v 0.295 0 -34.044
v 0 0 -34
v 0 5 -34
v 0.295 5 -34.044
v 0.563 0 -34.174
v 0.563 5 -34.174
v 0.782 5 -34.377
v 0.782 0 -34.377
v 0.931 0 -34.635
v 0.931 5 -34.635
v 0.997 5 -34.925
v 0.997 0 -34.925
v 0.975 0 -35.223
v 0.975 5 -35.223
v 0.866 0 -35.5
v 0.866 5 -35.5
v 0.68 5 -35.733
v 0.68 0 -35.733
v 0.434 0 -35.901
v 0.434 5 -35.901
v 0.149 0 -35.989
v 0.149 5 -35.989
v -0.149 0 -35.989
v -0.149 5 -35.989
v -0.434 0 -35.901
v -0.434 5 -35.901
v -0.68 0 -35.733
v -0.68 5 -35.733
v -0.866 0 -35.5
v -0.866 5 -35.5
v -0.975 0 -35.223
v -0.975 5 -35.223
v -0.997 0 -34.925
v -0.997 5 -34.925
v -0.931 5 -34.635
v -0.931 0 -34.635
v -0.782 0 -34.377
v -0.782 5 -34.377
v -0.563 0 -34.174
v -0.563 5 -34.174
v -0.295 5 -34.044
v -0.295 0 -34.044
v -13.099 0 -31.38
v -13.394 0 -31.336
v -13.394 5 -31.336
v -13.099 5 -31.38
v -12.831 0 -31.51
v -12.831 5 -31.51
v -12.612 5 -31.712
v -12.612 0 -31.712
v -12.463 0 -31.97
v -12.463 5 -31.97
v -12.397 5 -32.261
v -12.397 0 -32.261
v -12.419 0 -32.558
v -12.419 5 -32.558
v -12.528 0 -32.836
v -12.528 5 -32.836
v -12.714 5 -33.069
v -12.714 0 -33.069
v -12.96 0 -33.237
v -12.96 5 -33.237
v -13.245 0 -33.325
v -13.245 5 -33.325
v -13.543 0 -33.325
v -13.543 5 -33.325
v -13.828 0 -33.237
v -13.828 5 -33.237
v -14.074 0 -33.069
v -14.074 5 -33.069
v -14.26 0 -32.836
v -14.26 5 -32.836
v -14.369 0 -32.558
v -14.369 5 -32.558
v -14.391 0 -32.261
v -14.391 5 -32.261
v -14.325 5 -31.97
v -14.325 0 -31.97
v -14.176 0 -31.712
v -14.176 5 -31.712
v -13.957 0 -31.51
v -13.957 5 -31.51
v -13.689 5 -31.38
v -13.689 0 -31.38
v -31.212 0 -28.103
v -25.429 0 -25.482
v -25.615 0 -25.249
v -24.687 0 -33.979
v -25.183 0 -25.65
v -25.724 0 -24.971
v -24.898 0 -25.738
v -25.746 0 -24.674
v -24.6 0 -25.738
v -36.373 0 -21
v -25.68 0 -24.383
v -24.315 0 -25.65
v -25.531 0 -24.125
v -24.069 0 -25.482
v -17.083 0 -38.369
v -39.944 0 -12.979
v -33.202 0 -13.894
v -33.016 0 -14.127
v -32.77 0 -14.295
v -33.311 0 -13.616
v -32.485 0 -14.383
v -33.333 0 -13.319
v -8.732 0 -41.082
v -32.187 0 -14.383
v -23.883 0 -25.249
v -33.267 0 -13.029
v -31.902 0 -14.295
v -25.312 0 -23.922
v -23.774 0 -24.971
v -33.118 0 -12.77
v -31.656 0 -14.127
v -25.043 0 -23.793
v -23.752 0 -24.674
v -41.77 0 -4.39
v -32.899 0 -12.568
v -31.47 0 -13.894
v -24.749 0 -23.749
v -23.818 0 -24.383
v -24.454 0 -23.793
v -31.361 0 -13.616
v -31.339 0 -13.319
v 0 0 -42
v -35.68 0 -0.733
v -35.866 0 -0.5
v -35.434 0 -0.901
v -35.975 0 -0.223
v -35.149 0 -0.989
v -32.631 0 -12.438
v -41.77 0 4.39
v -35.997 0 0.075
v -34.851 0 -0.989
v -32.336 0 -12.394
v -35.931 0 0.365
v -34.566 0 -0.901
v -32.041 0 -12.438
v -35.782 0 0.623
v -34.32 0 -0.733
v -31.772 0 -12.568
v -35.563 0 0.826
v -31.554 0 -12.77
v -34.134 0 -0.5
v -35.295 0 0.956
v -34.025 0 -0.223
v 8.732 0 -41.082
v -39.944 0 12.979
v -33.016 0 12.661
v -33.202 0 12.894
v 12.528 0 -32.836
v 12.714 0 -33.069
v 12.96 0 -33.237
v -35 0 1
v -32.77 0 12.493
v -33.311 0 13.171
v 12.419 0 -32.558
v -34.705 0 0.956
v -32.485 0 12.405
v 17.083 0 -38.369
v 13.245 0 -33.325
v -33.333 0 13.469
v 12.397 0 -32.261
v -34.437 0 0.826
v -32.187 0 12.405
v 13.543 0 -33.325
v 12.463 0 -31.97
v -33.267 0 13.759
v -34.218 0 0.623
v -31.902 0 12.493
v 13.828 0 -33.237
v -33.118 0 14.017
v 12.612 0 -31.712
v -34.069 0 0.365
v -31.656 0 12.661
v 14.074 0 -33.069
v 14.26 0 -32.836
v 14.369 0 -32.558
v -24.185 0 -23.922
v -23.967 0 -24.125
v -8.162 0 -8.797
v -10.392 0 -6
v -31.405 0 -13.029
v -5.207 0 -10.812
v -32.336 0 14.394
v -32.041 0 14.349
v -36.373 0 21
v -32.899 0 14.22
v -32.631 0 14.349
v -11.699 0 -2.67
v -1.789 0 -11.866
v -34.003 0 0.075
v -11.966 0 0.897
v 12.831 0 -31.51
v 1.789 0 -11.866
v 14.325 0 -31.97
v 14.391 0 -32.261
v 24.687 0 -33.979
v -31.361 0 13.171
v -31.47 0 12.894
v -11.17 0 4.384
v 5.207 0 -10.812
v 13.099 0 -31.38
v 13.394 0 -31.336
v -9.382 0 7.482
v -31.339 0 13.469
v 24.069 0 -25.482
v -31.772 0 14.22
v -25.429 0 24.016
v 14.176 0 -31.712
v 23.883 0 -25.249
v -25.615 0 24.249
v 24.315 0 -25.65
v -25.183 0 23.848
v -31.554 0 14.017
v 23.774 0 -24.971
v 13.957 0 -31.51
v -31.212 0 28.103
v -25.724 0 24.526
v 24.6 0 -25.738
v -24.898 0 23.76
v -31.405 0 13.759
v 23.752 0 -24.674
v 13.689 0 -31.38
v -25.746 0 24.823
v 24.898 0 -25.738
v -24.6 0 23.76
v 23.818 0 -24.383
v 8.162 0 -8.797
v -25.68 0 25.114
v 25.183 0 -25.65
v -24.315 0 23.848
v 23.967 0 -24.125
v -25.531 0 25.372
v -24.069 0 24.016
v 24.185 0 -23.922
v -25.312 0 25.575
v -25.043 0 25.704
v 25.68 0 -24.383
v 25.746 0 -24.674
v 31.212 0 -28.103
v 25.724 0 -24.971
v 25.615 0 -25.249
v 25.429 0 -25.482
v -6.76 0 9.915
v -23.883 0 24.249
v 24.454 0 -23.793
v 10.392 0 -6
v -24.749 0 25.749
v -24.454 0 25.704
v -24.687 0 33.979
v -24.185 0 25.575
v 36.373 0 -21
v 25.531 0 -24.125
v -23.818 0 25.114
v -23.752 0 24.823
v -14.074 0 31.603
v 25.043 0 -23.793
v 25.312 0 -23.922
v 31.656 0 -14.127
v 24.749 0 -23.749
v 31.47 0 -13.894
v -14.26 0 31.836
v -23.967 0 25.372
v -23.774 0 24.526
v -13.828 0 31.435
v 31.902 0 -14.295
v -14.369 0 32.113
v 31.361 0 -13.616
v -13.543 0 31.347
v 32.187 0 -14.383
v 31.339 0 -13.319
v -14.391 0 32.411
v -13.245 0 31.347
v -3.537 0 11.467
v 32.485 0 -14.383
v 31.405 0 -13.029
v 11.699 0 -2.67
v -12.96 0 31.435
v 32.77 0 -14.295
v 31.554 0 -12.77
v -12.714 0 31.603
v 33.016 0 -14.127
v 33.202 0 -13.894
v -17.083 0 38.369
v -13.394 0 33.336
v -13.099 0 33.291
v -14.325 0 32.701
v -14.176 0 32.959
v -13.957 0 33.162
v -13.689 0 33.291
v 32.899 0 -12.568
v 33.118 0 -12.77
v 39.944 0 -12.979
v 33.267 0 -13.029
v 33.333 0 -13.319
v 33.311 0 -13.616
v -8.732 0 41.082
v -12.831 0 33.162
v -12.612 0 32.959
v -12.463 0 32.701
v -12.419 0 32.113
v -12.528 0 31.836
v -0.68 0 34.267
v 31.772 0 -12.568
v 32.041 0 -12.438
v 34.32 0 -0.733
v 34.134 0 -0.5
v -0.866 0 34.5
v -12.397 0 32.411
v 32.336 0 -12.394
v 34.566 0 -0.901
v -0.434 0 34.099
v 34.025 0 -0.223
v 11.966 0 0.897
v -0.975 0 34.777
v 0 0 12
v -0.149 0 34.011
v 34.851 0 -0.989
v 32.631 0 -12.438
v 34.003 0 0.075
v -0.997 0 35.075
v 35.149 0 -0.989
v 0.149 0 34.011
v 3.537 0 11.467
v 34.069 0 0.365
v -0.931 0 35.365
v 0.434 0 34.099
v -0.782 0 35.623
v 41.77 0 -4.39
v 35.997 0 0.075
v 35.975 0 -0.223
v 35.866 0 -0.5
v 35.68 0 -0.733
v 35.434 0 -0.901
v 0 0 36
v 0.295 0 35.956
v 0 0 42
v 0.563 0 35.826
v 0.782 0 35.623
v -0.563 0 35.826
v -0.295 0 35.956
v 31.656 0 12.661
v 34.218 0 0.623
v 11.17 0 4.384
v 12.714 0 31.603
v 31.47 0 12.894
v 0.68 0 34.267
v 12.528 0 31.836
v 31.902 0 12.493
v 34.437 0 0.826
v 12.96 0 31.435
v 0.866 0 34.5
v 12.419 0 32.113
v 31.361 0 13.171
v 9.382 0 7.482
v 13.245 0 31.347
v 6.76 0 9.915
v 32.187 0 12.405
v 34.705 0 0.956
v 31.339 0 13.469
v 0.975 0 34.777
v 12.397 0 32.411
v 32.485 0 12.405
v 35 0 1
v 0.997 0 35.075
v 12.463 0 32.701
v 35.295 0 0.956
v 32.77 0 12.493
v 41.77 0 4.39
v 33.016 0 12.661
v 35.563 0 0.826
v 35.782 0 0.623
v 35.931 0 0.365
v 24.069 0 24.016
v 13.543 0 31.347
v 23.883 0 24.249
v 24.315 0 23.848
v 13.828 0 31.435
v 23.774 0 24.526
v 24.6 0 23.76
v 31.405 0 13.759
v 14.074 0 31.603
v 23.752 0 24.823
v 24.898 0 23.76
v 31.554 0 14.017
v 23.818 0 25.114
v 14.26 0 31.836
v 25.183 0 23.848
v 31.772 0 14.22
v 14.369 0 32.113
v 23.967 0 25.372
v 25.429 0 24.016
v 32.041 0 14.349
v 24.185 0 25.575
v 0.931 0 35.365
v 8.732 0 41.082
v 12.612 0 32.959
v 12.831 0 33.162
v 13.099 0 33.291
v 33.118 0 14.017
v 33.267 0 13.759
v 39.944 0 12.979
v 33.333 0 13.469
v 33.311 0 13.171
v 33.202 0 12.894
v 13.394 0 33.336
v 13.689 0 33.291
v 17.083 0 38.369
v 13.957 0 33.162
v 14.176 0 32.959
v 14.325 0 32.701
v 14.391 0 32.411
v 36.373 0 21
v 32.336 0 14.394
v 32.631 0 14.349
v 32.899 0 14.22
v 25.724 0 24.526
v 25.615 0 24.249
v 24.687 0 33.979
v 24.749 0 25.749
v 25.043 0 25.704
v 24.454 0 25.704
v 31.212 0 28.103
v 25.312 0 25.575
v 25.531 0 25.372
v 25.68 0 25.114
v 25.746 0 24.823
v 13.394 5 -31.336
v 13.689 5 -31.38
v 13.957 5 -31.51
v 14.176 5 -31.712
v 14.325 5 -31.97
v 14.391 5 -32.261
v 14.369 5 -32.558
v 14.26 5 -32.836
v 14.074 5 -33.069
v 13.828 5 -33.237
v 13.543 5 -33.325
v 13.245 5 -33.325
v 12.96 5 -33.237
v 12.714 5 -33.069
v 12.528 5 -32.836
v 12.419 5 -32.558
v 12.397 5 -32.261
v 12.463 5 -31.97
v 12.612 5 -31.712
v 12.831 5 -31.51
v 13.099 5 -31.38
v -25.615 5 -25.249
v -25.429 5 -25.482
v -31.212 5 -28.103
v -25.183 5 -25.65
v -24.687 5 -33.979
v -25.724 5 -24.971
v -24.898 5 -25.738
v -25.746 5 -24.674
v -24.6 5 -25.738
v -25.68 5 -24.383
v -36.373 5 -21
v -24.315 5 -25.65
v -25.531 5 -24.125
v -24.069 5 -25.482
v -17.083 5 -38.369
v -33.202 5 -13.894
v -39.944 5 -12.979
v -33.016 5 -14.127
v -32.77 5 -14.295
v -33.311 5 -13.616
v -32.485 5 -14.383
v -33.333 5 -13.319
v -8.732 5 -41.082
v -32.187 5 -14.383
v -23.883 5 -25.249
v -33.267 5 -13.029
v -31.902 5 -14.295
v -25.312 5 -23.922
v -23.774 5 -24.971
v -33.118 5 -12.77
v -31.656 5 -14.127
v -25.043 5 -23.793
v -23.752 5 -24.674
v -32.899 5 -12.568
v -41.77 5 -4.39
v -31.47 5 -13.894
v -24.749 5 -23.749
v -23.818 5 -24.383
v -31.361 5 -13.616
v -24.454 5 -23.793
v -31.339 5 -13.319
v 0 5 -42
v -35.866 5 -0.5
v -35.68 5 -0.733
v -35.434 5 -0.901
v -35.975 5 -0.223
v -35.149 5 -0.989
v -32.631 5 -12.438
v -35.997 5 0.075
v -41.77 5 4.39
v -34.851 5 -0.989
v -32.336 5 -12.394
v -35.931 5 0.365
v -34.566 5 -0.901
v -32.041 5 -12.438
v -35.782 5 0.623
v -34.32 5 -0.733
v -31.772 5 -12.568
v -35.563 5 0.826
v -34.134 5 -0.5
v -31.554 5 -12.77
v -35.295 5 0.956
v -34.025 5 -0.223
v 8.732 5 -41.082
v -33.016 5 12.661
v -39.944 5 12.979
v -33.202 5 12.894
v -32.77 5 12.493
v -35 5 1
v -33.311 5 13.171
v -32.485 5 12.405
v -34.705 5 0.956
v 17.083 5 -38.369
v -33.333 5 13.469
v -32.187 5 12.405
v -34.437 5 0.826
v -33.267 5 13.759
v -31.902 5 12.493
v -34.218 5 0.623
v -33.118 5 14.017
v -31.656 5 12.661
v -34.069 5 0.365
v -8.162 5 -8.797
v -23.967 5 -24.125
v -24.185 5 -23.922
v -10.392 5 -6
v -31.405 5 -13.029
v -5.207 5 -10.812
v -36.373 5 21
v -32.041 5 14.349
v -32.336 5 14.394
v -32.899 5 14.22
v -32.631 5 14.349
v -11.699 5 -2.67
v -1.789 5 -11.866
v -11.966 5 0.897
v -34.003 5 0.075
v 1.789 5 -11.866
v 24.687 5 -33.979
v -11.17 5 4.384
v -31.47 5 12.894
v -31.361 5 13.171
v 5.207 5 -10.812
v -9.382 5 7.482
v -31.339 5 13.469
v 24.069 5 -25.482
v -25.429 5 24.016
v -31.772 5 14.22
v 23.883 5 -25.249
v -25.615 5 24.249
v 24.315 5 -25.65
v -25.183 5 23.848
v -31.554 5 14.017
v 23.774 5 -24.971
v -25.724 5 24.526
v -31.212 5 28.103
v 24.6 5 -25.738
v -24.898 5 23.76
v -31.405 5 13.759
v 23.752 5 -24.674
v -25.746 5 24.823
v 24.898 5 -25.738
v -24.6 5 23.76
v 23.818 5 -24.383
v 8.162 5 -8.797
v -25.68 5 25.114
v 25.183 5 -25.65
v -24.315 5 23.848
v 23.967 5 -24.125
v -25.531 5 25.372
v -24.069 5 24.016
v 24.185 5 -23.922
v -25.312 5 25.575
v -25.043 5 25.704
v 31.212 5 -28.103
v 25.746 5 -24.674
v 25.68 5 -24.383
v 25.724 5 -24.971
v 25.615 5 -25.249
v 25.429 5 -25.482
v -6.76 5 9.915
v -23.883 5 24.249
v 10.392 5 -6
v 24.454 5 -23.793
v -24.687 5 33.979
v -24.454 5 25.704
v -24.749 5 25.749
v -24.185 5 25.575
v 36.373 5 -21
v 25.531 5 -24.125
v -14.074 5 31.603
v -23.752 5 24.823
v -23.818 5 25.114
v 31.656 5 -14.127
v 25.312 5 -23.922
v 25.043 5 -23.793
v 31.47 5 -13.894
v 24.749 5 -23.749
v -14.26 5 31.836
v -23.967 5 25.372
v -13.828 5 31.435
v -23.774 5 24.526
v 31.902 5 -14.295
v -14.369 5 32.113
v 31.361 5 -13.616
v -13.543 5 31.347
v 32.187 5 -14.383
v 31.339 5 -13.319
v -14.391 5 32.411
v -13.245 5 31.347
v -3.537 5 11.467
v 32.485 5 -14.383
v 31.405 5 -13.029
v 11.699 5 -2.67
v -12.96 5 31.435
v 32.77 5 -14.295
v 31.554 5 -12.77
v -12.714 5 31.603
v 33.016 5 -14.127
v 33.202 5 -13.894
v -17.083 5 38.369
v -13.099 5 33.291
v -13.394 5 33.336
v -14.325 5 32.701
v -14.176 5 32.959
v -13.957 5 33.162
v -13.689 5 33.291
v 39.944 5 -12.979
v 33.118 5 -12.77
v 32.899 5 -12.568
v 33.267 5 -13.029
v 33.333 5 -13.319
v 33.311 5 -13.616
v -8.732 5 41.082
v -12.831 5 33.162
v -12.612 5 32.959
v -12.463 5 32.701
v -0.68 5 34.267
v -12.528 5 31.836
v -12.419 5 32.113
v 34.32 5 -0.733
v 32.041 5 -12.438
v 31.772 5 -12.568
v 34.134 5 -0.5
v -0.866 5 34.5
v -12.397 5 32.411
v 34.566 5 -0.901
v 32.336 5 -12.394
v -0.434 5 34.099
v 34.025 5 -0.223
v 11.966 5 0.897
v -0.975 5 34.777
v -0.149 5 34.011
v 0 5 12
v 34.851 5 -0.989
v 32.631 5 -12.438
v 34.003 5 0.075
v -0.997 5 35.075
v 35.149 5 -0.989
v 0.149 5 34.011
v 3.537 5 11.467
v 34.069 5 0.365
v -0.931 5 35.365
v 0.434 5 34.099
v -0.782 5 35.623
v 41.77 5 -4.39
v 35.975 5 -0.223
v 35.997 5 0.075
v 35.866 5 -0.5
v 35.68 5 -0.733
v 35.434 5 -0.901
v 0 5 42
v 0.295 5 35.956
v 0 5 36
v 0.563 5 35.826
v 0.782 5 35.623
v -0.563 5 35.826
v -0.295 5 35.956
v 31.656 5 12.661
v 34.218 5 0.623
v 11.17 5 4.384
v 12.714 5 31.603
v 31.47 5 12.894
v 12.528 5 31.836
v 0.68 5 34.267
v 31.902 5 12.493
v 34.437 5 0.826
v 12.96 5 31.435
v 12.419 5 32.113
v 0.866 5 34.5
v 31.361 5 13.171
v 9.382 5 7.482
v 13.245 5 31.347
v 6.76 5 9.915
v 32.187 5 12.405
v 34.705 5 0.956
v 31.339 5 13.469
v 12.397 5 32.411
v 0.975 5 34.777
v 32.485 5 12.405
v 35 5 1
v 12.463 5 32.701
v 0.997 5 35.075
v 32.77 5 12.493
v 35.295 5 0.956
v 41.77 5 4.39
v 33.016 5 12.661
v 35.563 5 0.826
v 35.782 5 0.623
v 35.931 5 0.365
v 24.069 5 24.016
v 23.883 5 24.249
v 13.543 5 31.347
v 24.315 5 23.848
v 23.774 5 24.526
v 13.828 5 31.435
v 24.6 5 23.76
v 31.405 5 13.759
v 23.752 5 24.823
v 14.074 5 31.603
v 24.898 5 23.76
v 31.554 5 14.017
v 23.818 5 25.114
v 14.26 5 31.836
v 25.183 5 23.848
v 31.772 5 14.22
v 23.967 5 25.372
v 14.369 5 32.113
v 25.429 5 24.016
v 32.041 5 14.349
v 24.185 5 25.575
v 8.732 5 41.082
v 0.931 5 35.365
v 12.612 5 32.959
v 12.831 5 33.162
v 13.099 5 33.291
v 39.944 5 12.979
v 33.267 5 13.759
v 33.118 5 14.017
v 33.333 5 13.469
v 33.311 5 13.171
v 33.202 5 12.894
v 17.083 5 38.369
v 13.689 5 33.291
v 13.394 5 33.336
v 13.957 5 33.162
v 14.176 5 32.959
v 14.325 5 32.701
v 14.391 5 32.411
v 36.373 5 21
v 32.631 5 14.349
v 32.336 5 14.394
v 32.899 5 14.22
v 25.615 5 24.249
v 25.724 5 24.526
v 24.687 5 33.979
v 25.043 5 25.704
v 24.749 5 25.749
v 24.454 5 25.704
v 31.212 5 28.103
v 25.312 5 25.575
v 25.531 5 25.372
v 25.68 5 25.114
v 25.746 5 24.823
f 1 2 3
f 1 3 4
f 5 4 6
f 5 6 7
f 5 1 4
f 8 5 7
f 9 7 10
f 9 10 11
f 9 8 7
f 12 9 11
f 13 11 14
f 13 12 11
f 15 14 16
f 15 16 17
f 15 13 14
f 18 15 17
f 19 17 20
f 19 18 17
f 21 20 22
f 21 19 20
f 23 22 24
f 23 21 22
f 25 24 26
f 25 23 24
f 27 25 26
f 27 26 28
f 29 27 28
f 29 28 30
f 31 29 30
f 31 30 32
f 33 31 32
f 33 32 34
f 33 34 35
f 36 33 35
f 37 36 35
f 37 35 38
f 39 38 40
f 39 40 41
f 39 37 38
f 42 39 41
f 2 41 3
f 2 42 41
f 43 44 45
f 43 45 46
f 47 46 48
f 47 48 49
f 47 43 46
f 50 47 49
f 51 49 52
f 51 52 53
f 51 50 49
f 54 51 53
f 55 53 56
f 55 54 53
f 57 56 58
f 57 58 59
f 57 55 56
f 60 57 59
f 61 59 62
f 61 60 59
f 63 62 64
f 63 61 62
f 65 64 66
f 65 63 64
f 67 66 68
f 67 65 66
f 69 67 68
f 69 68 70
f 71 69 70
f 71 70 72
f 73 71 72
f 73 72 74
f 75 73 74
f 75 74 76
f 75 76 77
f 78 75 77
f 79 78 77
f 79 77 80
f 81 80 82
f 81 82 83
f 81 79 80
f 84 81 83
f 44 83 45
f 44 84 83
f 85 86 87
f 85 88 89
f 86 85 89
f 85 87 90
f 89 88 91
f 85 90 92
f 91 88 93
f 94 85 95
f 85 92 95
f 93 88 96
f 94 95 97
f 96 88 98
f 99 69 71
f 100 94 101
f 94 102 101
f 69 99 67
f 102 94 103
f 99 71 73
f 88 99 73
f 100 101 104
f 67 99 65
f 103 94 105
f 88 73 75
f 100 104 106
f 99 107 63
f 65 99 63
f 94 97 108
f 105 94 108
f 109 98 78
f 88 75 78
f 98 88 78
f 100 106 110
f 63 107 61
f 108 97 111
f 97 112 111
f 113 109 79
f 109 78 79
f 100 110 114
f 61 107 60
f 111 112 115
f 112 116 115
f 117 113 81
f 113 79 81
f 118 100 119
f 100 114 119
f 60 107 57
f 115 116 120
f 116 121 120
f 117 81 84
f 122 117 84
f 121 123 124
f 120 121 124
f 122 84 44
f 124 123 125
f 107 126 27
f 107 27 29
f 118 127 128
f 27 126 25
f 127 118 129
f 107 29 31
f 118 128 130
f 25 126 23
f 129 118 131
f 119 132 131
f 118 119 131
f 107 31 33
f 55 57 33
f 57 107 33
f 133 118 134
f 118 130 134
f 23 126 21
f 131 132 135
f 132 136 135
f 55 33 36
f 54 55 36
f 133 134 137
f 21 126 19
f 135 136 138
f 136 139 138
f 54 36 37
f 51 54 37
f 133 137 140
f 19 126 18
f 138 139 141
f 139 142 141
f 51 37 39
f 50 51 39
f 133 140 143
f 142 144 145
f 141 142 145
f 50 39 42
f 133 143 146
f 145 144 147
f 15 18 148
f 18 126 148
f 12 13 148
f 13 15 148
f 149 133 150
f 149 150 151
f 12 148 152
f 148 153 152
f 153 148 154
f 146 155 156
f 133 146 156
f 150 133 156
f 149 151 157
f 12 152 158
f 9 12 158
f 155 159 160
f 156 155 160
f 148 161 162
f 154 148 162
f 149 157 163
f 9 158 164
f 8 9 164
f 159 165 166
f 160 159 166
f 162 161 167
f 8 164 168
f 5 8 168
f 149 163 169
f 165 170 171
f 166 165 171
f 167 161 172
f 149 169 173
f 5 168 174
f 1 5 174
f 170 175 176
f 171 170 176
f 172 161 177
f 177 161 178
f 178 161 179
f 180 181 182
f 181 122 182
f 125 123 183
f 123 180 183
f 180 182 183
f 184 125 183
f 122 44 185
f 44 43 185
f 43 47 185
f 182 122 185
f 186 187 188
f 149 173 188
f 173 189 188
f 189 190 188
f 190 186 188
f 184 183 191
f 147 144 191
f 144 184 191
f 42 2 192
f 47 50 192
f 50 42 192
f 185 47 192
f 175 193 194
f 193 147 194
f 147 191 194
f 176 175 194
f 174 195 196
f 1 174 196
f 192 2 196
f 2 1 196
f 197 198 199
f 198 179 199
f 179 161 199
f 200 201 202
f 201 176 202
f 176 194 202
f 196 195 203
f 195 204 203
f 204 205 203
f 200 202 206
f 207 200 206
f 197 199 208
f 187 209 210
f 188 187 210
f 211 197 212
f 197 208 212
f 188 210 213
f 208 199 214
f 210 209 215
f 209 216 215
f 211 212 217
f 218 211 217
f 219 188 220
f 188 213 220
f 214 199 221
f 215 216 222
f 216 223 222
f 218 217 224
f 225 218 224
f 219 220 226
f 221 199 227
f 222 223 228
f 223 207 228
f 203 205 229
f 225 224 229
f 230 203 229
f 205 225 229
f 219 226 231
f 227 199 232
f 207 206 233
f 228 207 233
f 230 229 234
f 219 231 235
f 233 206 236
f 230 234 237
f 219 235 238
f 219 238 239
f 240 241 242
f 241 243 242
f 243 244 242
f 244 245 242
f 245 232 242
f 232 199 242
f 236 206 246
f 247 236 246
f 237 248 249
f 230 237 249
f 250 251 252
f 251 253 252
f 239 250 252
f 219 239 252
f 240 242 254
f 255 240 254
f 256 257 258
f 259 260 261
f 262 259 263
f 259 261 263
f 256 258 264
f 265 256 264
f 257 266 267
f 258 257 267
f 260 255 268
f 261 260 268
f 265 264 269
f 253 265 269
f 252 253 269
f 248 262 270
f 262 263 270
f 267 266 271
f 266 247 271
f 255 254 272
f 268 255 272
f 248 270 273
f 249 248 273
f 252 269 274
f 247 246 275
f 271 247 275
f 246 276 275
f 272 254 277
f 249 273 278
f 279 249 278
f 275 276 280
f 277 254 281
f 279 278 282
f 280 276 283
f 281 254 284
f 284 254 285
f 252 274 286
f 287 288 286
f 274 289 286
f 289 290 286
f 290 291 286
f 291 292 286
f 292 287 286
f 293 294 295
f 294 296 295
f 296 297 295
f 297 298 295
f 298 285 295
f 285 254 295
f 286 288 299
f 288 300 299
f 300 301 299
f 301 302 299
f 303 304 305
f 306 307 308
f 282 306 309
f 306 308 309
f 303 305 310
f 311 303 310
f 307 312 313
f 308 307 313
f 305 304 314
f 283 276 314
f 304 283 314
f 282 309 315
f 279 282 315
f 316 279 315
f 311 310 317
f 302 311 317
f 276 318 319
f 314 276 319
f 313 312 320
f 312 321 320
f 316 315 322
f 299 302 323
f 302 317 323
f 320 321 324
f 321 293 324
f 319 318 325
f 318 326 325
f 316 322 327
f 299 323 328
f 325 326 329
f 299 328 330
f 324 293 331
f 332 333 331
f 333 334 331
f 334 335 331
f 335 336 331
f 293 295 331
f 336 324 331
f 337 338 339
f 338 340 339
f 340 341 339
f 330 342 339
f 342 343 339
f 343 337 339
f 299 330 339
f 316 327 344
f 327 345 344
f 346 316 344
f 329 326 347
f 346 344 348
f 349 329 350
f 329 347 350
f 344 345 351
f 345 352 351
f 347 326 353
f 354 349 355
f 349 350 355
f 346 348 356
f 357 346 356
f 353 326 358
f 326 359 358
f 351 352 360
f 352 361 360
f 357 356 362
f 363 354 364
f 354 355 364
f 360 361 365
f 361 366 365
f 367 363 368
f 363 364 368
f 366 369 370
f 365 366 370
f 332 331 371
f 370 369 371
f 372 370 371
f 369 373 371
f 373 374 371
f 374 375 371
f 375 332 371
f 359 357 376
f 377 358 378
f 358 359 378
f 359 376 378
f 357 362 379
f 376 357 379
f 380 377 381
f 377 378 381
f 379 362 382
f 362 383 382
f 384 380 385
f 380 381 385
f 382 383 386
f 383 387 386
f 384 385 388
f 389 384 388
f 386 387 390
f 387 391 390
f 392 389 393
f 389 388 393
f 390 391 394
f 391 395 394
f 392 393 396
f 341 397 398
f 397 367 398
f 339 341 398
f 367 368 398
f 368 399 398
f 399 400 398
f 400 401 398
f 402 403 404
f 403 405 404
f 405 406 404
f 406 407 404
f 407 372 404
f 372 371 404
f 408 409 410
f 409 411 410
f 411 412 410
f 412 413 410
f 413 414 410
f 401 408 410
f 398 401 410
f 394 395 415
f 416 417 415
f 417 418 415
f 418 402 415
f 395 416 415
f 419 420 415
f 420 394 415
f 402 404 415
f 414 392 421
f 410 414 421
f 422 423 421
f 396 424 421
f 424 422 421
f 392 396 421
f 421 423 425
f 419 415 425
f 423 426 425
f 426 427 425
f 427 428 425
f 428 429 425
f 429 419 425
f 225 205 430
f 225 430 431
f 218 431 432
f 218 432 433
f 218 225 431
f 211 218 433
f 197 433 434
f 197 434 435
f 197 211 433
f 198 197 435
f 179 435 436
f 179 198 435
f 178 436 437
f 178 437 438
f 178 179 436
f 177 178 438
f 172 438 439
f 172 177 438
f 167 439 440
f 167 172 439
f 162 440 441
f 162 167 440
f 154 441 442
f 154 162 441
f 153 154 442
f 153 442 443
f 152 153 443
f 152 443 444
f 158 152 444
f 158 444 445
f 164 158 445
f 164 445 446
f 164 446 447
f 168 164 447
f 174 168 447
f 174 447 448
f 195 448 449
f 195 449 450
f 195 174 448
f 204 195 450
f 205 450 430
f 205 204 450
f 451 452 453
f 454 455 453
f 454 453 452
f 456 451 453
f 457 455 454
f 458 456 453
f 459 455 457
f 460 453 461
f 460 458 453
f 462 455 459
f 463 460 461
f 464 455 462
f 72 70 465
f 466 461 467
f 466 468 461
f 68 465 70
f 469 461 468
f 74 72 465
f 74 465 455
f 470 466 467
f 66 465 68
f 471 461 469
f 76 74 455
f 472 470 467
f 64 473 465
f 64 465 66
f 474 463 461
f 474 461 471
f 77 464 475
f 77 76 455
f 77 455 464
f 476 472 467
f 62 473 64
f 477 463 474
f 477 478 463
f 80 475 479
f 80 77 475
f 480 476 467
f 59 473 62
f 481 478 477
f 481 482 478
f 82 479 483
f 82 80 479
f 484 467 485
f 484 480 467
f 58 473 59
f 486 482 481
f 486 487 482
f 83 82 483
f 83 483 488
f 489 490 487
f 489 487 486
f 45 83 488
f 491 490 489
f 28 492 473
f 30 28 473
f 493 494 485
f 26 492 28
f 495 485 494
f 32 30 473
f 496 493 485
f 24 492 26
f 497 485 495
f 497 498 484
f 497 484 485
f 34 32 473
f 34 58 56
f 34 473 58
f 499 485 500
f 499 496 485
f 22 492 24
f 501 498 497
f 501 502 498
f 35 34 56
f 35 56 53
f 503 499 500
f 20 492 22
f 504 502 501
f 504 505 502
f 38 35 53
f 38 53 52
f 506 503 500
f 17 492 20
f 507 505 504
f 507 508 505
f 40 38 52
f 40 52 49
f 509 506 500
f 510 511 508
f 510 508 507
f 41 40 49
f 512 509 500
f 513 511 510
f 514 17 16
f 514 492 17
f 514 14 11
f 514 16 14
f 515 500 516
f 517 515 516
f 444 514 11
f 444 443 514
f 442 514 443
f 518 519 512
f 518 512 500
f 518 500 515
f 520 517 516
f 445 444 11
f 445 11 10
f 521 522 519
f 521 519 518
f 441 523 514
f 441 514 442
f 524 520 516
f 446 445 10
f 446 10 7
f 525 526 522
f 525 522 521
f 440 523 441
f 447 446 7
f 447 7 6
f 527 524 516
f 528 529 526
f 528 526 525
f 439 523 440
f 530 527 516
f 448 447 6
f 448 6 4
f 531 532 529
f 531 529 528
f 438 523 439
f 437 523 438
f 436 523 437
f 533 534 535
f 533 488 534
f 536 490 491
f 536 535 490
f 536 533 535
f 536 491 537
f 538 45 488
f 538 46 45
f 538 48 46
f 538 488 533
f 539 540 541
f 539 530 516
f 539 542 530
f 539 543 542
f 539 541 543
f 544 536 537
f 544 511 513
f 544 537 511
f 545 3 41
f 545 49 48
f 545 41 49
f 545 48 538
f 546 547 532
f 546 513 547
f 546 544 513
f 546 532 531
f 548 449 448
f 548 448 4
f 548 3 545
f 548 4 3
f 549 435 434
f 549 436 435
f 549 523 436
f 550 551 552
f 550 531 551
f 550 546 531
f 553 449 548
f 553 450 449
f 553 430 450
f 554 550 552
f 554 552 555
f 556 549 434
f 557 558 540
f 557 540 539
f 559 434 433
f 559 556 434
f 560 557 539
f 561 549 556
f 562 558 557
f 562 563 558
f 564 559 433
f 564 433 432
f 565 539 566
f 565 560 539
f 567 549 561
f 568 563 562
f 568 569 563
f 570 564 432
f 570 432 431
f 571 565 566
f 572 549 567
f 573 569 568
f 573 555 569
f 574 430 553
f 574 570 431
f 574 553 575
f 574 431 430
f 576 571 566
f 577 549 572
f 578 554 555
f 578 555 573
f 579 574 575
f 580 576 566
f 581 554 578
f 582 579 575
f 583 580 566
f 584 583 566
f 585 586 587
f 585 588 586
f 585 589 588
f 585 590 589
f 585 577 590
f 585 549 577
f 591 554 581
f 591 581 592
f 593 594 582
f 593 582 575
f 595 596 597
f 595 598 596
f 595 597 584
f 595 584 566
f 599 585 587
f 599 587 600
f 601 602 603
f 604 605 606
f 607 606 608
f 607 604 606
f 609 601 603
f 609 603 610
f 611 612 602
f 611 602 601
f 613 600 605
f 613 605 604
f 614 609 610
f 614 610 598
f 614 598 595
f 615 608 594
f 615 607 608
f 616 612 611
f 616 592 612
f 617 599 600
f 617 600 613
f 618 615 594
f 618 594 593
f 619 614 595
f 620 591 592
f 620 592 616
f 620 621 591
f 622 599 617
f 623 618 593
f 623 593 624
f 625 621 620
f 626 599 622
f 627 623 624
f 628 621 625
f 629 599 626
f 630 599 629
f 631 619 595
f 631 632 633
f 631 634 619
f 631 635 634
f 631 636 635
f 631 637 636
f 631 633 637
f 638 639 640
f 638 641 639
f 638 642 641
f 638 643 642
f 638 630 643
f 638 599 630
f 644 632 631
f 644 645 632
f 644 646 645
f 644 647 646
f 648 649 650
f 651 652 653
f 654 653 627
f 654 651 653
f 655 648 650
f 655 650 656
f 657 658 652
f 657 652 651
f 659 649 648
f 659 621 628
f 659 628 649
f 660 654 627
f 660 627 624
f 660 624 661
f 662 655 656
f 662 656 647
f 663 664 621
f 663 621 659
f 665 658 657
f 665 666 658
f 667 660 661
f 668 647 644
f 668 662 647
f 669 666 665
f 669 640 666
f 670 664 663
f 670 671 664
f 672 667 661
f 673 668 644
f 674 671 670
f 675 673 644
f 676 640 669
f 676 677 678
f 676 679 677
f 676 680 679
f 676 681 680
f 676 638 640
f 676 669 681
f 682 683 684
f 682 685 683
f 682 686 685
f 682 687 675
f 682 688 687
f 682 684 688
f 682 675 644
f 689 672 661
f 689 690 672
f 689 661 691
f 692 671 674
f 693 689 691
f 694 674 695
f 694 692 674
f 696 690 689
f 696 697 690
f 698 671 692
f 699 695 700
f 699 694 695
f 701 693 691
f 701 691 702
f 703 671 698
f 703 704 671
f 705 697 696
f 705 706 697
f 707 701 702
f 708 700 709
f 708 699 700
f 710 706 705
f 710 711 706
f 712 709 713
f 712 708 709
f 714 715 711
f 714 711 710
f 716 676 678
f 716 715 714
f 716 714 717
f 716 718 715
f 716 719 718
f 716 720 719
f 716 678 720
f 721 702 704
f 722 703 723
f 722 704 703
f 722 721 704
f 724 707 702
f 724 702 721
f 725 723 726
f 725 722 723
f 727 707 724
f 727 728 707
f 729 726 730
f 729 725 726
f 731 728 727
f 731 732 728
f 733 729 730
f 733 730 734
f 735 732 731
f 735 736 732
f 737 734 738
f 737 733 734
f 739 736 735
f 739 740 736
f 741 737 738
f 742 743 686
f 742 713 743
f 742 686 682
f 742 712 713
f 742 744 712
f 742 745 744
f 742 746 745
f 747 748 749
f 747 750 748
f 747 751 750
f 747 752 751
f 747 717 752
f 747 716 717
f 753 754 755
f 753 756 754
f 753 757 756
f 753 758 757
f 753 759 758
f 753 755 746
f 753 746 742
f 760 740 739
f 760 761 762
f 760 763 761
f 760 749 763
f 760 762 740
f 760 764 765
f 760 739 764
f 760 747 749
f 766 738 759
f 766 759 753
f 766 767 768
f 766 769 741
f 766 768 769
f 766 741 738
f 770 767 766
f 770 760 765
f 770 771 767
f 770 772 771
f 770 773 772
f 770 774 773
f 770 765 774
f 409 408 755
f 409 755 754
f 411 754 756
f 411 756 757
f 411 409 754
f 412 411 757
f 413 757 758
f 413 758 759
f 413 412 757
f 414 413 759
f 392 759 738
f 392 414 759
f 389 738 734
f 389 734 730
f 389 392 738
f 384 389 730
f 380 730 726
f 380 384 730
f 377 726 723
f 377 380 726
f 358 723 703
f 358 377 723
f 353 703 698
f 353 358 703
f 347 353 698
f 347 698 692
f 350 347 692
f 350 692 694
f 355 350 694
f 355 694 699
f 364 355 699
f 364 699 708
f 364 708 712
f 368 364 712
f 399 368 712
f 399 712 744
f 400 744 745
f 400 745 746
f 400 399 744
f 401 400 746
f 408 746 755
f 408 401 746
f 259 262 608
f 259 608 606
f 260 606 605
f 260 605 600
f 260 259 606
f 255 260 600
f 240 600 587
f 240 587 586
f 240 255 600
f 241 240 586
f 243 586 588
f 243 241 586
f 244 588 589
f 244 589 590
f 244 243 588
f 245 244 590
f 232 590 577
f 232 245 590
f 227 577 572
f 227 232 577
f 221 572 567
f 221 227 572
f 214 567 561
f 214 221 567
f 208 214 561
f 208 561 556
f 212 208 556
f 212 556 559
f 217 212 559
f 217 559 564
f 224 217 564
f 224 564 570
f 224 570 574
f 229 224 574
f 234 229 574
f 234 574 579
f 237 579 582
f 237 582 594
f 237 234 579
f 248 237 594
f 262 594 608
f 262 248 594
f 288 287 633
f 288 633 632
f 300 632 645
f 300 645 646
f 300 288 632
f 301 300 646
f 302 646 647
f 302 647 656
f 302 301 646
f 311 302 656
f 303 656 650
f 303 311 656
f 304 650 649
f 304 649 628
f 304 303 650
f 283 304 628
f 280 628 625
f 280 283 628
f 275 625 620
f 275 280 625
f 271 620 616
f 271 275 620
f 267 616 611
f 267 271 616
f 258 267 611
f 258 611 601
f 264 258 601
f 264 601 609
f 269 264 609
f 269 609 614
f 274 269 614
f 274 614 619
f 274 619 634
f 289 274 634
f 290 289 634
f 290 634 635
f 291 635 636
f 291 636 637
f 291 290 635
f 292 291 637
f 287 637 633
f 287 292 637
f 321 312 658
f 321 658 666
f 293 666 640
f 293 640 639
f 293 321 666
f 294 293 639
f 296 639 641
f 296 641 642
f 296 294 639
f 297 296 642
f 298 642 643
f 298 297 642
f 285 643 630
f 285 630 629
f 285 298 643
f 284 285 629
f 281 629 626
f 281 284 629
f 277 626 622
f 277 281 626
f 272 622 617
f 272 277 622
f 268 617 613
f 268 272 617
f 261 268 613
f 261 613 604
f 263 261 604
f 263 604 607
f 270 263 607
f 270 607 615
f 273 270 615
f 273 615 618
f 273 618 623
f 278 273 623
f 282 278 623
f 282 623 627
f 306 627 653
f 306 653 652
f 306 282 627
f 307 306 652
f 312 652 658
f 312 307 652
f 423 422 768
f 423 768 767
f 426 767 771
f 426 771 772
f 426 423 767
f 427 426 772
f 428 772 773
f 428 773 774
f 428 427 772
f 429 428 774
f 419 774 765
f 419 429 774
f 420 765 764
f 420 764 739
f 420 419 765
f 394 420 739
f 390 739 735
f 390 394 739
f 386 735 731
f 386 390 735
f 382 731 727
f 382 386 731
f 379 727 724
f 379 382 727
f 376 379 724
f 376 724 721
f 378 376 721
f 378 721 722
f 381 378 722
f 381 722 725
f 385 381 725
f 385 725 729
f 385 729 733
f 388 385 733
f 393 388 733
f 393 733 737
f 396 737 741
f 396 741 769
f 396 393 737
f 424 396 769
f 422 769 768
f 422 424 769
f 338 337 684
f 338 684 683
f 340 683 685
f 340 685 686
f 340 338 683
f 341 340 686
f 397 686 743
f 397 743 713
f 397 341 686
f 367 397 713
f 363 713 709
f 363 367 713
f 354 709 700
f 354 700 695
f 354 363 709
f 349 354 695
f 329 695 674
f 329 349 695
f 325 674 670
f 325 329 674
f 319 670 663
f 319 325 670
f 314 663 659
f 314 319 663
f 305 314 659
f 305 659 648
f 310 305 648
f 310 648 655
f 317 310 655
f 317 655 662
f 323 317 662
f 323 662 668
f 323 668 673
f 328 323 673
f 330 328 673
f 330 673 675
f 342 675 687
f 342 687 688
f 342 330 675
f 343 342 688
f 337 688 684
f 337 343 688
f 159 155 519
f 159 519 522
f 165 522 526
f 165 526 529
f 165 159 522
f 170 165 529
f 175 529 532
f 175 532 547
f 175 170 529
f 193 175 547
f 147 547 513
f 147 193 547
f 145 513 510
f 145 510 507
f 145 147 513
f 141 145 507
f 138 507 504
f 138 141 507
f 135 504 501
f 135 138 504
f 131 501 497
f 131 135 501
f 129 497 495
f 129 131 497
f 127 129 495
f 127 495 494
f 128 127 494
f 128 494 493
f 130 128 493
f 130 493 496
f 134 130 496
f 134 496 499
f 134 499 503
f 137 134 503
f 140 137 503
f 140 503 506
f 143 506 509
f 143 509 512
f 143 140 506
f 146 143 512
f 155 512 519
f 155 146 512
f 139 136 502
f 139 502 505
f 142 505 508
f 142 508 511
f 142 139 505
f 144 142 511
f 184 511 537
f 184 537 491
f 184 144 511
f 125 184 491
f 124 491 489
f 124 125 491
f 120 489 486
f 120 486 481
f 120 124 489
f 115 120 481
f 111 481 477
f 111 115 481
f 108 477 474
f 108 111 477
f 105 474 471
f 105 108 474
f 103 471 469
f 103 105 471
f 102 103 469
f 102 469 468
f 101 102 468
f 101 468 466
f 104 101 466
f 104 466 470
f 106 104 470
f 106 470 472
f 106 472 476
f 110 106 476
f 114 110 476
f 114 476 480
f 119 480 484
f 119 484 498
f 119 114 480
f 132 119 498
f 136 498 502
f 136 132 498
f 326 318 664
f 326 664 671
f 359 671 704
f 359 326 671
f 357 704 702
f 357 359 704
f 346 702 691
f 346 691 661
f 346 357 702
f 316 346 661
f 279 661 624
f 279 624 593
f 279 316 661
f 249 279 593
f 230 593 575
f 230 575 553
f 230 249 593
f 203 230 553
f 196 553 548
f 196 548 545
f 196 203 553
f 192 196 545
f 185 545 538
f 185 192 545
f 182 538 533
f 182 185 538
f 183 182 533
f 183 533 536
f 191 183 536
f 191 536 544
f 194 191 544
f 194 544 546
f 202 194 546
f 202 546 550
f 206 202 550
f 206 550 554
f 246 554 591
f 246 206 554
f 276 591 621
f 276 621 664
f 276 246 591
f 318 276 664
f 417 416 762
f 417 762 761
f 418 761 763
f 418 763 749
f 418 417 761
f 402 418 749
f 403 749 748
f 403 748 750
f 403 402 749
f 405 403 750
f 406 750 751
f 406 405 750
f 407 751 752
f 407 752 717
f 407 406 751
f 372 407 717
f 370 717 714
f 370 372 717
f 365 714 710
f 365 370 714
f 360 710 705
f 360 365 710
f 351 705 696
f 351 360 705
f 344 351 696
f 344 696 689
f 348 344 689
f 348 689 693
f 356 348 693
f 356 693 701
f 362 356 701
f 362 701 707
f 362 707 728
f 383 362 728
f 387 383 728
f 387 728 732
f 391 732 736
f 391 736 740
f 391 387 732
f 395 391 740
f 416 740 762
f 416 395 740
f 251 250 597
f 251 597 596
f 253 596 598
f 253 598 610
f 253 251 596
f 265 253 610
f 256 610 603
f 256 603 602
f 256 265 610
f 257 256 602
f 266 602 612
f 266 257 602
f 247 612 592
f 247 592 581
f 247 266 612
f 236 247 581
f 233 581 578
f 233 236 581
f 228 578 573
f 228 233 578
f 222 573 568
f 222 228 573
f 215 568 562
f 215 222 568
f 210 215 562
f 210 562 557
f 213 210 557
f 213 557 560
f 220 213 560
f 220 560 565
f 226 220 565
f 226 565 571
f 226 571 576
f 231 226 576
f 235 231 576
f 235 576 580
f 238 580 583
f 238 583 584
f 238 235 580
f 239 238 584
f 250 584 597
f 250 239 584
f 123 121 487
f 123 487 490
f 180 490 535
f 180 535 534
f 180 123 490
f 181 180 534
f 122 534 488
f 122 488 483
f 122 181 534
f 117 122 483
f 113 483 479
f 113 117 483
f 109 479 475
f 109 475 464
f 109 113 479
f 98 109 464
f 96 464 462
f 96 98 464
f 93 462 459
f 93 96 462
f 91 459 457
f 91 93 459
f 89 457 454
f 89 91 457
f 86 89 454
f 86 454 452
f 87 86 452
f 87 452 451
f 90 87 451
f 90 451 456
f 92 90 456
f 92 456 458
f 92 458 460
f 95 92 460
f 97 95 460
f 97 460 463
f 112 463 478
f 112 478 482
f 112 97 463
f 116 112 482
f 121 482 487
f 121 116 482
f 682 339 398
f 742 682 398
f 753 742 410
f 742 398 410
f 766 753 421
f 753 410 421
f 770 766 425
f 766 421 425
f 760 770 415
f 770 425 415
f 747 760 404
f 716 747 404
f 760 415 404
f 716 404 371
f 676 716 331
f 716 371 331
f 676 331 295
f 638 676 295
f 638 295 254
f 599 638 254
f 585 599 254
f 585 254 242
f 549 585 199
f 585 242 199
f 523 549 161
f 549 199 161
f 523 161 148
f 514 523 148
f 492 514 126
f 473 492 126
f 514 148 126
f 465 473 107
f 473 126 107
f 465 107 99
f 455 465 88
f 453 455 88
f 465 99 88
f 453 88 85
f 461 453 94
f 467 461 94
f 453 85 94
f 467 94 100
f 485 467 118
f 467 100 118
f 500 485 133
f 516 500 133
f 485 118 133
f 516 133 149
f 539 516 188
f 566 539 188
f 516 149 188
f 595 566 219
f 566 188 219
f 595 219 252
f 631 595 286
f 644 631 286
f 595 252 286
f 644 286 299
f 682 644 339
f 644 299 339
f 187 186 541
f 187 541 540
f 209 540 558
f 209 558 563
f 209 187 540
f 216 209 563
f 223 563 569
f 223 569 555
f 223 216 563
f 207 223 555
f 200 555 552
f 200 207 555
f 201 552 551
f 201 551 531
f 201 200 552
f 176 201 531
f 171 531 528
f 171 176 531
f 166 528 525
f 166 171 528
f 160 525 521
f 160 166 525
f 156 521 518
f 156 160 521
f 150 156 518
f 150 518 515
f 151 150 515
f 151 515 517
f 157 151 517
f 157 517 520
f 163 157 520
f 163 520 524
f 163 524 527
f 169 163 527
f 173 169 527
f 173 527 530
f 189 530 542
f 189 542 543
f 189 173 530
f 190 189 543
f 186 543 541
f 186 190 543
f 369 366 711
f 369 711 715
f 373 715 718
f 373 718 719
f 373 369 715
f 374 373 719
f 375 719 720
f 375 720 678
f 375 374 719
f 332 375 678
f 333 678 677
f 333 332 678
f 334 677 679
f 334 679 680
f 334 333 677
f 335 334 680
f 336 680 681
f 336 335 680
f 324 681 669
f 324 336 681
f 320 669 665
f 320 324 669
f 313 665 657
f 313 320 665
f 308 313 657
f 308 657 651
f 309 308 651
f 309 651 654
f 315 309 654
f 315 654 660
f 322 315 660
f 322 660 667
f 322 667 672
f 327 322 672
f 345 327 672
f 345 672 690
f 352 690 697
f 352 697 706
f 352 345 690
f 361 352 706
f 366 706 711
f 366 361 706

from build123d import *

# Parameters (mm, degrees)
SKETCH1_R           = 42
SKETCH1_R_2         = 12
SKETCH1_R_3         = 1
BOSS_EXTRUDE1_DEPTH = 5


with BuildPart() as part:
    # Sketch1 → Boss-Extrude1 (new body)
    with BuildSketch(Plane(origin=(0, 0, 0), x_dir=(1, 0, 0), z_dir=(0, 1, 0))):
        with Locations(Location((0, 0, 0), (0, 0, 270))):
            Circle(SKETCH1_R)
        with Locations(Location((0, 0, 0), (0, 0, 270))):
            Circle(SKETCH1_R_2, mode=Mode.SUBTRACT)
        with Locations(Location((35, 0, 0), (0, 0, 270))):
            Circle(SKETCH1_R_3, mode=Mode.SUBTRACT)
        with Locations(Location((32.335783638, -13.393920133, 0), (0, 0, 270))):
            Circle(SKETCH1_R_3, mode=Mode.SUBTRACT)
        with Locations(Location((24.748737342, -24.748737342, 0), (0, 0, 270))):
            Circle(SKETCH1_R_3, mode=Mode.SUBTRACT)
        with Locations(Location((13.393920133, -32.335783638, 0), (0, 0, 270))):
            Circle(SKETCH1_R_3, mode=Mode.SUBTRACT)
        with Locations(Location((0, -35, 0), (0, 0, 270))):
            Circle(SKETCH1_R_3, mode=Mode.SUBTRACT)
        with Locations(Location((-13.393920133, -32.335783638, 0), (0, 0, 270))):
            Circle(SKETCH1_R_3, mode=Mode.SUBTRACT)
        with Locations(Location((-24.748737342, -24.748737342, 0), (0, 0, 270))):
            Circle(SKETCH1_R_3, mode=Mode.SUBTRACT)
        with Locations(Location((-32.335783638, -13.393920133, 0), (0, 0, 270))):
            Circle(SKETCH1_R_3, mode=Mode.SUBTRACT)
        with Locations(Location((-35, 0, 0), (0, 0, 270))):
            Circle(SKETCH1_R_3, mode=Mode.SUBTRACT)
        with Locations(Location((-32.335783638, 13.393920133, 0), (0, 0, 270))):
            Circle(SKETCH1_R_3, mode=Mode.SUBTRACT)
        with Locations(Location((-24.748737342, 24.748737342, 0), (0, 0, 270))):
            Circle(SKETCH1_R_3, mode=Mode.SUBTRACT)
        with Locations(Location((-13.393920133, 32.335783638, 0), (0, 0, 270))):
            Circle(SKETCH1_R_3, mode=Mode.SUBTRACT)
        with Locations(Location((0, 35, 0), (0, 0, 270))):
            Circle(SKETCH1_R_3, mode=Mode.SUBTRACT)
        with Locations(Location((13.393920133, 32.335783638, 0), (0, 0, 270))):
            Circle(SKETCH1_R_3, mode=Mode.SUBTRACT)
        with Locations(Location((24.748737342, 24.748737342, 0), (0, 0, 270))):
            Circle(SKETCH1_R_3, mode=Mode.SUBTRACT)
        with Locations(Location((32.335783638, 13.393920133, 0), (0, 0, 270))):
            Circle(SKETCH1_R_3, mode=Mode.SUBTRACT)
    extrude(amount=BOSS_EXTRUDE1_DEPTH)


solid = part.part
